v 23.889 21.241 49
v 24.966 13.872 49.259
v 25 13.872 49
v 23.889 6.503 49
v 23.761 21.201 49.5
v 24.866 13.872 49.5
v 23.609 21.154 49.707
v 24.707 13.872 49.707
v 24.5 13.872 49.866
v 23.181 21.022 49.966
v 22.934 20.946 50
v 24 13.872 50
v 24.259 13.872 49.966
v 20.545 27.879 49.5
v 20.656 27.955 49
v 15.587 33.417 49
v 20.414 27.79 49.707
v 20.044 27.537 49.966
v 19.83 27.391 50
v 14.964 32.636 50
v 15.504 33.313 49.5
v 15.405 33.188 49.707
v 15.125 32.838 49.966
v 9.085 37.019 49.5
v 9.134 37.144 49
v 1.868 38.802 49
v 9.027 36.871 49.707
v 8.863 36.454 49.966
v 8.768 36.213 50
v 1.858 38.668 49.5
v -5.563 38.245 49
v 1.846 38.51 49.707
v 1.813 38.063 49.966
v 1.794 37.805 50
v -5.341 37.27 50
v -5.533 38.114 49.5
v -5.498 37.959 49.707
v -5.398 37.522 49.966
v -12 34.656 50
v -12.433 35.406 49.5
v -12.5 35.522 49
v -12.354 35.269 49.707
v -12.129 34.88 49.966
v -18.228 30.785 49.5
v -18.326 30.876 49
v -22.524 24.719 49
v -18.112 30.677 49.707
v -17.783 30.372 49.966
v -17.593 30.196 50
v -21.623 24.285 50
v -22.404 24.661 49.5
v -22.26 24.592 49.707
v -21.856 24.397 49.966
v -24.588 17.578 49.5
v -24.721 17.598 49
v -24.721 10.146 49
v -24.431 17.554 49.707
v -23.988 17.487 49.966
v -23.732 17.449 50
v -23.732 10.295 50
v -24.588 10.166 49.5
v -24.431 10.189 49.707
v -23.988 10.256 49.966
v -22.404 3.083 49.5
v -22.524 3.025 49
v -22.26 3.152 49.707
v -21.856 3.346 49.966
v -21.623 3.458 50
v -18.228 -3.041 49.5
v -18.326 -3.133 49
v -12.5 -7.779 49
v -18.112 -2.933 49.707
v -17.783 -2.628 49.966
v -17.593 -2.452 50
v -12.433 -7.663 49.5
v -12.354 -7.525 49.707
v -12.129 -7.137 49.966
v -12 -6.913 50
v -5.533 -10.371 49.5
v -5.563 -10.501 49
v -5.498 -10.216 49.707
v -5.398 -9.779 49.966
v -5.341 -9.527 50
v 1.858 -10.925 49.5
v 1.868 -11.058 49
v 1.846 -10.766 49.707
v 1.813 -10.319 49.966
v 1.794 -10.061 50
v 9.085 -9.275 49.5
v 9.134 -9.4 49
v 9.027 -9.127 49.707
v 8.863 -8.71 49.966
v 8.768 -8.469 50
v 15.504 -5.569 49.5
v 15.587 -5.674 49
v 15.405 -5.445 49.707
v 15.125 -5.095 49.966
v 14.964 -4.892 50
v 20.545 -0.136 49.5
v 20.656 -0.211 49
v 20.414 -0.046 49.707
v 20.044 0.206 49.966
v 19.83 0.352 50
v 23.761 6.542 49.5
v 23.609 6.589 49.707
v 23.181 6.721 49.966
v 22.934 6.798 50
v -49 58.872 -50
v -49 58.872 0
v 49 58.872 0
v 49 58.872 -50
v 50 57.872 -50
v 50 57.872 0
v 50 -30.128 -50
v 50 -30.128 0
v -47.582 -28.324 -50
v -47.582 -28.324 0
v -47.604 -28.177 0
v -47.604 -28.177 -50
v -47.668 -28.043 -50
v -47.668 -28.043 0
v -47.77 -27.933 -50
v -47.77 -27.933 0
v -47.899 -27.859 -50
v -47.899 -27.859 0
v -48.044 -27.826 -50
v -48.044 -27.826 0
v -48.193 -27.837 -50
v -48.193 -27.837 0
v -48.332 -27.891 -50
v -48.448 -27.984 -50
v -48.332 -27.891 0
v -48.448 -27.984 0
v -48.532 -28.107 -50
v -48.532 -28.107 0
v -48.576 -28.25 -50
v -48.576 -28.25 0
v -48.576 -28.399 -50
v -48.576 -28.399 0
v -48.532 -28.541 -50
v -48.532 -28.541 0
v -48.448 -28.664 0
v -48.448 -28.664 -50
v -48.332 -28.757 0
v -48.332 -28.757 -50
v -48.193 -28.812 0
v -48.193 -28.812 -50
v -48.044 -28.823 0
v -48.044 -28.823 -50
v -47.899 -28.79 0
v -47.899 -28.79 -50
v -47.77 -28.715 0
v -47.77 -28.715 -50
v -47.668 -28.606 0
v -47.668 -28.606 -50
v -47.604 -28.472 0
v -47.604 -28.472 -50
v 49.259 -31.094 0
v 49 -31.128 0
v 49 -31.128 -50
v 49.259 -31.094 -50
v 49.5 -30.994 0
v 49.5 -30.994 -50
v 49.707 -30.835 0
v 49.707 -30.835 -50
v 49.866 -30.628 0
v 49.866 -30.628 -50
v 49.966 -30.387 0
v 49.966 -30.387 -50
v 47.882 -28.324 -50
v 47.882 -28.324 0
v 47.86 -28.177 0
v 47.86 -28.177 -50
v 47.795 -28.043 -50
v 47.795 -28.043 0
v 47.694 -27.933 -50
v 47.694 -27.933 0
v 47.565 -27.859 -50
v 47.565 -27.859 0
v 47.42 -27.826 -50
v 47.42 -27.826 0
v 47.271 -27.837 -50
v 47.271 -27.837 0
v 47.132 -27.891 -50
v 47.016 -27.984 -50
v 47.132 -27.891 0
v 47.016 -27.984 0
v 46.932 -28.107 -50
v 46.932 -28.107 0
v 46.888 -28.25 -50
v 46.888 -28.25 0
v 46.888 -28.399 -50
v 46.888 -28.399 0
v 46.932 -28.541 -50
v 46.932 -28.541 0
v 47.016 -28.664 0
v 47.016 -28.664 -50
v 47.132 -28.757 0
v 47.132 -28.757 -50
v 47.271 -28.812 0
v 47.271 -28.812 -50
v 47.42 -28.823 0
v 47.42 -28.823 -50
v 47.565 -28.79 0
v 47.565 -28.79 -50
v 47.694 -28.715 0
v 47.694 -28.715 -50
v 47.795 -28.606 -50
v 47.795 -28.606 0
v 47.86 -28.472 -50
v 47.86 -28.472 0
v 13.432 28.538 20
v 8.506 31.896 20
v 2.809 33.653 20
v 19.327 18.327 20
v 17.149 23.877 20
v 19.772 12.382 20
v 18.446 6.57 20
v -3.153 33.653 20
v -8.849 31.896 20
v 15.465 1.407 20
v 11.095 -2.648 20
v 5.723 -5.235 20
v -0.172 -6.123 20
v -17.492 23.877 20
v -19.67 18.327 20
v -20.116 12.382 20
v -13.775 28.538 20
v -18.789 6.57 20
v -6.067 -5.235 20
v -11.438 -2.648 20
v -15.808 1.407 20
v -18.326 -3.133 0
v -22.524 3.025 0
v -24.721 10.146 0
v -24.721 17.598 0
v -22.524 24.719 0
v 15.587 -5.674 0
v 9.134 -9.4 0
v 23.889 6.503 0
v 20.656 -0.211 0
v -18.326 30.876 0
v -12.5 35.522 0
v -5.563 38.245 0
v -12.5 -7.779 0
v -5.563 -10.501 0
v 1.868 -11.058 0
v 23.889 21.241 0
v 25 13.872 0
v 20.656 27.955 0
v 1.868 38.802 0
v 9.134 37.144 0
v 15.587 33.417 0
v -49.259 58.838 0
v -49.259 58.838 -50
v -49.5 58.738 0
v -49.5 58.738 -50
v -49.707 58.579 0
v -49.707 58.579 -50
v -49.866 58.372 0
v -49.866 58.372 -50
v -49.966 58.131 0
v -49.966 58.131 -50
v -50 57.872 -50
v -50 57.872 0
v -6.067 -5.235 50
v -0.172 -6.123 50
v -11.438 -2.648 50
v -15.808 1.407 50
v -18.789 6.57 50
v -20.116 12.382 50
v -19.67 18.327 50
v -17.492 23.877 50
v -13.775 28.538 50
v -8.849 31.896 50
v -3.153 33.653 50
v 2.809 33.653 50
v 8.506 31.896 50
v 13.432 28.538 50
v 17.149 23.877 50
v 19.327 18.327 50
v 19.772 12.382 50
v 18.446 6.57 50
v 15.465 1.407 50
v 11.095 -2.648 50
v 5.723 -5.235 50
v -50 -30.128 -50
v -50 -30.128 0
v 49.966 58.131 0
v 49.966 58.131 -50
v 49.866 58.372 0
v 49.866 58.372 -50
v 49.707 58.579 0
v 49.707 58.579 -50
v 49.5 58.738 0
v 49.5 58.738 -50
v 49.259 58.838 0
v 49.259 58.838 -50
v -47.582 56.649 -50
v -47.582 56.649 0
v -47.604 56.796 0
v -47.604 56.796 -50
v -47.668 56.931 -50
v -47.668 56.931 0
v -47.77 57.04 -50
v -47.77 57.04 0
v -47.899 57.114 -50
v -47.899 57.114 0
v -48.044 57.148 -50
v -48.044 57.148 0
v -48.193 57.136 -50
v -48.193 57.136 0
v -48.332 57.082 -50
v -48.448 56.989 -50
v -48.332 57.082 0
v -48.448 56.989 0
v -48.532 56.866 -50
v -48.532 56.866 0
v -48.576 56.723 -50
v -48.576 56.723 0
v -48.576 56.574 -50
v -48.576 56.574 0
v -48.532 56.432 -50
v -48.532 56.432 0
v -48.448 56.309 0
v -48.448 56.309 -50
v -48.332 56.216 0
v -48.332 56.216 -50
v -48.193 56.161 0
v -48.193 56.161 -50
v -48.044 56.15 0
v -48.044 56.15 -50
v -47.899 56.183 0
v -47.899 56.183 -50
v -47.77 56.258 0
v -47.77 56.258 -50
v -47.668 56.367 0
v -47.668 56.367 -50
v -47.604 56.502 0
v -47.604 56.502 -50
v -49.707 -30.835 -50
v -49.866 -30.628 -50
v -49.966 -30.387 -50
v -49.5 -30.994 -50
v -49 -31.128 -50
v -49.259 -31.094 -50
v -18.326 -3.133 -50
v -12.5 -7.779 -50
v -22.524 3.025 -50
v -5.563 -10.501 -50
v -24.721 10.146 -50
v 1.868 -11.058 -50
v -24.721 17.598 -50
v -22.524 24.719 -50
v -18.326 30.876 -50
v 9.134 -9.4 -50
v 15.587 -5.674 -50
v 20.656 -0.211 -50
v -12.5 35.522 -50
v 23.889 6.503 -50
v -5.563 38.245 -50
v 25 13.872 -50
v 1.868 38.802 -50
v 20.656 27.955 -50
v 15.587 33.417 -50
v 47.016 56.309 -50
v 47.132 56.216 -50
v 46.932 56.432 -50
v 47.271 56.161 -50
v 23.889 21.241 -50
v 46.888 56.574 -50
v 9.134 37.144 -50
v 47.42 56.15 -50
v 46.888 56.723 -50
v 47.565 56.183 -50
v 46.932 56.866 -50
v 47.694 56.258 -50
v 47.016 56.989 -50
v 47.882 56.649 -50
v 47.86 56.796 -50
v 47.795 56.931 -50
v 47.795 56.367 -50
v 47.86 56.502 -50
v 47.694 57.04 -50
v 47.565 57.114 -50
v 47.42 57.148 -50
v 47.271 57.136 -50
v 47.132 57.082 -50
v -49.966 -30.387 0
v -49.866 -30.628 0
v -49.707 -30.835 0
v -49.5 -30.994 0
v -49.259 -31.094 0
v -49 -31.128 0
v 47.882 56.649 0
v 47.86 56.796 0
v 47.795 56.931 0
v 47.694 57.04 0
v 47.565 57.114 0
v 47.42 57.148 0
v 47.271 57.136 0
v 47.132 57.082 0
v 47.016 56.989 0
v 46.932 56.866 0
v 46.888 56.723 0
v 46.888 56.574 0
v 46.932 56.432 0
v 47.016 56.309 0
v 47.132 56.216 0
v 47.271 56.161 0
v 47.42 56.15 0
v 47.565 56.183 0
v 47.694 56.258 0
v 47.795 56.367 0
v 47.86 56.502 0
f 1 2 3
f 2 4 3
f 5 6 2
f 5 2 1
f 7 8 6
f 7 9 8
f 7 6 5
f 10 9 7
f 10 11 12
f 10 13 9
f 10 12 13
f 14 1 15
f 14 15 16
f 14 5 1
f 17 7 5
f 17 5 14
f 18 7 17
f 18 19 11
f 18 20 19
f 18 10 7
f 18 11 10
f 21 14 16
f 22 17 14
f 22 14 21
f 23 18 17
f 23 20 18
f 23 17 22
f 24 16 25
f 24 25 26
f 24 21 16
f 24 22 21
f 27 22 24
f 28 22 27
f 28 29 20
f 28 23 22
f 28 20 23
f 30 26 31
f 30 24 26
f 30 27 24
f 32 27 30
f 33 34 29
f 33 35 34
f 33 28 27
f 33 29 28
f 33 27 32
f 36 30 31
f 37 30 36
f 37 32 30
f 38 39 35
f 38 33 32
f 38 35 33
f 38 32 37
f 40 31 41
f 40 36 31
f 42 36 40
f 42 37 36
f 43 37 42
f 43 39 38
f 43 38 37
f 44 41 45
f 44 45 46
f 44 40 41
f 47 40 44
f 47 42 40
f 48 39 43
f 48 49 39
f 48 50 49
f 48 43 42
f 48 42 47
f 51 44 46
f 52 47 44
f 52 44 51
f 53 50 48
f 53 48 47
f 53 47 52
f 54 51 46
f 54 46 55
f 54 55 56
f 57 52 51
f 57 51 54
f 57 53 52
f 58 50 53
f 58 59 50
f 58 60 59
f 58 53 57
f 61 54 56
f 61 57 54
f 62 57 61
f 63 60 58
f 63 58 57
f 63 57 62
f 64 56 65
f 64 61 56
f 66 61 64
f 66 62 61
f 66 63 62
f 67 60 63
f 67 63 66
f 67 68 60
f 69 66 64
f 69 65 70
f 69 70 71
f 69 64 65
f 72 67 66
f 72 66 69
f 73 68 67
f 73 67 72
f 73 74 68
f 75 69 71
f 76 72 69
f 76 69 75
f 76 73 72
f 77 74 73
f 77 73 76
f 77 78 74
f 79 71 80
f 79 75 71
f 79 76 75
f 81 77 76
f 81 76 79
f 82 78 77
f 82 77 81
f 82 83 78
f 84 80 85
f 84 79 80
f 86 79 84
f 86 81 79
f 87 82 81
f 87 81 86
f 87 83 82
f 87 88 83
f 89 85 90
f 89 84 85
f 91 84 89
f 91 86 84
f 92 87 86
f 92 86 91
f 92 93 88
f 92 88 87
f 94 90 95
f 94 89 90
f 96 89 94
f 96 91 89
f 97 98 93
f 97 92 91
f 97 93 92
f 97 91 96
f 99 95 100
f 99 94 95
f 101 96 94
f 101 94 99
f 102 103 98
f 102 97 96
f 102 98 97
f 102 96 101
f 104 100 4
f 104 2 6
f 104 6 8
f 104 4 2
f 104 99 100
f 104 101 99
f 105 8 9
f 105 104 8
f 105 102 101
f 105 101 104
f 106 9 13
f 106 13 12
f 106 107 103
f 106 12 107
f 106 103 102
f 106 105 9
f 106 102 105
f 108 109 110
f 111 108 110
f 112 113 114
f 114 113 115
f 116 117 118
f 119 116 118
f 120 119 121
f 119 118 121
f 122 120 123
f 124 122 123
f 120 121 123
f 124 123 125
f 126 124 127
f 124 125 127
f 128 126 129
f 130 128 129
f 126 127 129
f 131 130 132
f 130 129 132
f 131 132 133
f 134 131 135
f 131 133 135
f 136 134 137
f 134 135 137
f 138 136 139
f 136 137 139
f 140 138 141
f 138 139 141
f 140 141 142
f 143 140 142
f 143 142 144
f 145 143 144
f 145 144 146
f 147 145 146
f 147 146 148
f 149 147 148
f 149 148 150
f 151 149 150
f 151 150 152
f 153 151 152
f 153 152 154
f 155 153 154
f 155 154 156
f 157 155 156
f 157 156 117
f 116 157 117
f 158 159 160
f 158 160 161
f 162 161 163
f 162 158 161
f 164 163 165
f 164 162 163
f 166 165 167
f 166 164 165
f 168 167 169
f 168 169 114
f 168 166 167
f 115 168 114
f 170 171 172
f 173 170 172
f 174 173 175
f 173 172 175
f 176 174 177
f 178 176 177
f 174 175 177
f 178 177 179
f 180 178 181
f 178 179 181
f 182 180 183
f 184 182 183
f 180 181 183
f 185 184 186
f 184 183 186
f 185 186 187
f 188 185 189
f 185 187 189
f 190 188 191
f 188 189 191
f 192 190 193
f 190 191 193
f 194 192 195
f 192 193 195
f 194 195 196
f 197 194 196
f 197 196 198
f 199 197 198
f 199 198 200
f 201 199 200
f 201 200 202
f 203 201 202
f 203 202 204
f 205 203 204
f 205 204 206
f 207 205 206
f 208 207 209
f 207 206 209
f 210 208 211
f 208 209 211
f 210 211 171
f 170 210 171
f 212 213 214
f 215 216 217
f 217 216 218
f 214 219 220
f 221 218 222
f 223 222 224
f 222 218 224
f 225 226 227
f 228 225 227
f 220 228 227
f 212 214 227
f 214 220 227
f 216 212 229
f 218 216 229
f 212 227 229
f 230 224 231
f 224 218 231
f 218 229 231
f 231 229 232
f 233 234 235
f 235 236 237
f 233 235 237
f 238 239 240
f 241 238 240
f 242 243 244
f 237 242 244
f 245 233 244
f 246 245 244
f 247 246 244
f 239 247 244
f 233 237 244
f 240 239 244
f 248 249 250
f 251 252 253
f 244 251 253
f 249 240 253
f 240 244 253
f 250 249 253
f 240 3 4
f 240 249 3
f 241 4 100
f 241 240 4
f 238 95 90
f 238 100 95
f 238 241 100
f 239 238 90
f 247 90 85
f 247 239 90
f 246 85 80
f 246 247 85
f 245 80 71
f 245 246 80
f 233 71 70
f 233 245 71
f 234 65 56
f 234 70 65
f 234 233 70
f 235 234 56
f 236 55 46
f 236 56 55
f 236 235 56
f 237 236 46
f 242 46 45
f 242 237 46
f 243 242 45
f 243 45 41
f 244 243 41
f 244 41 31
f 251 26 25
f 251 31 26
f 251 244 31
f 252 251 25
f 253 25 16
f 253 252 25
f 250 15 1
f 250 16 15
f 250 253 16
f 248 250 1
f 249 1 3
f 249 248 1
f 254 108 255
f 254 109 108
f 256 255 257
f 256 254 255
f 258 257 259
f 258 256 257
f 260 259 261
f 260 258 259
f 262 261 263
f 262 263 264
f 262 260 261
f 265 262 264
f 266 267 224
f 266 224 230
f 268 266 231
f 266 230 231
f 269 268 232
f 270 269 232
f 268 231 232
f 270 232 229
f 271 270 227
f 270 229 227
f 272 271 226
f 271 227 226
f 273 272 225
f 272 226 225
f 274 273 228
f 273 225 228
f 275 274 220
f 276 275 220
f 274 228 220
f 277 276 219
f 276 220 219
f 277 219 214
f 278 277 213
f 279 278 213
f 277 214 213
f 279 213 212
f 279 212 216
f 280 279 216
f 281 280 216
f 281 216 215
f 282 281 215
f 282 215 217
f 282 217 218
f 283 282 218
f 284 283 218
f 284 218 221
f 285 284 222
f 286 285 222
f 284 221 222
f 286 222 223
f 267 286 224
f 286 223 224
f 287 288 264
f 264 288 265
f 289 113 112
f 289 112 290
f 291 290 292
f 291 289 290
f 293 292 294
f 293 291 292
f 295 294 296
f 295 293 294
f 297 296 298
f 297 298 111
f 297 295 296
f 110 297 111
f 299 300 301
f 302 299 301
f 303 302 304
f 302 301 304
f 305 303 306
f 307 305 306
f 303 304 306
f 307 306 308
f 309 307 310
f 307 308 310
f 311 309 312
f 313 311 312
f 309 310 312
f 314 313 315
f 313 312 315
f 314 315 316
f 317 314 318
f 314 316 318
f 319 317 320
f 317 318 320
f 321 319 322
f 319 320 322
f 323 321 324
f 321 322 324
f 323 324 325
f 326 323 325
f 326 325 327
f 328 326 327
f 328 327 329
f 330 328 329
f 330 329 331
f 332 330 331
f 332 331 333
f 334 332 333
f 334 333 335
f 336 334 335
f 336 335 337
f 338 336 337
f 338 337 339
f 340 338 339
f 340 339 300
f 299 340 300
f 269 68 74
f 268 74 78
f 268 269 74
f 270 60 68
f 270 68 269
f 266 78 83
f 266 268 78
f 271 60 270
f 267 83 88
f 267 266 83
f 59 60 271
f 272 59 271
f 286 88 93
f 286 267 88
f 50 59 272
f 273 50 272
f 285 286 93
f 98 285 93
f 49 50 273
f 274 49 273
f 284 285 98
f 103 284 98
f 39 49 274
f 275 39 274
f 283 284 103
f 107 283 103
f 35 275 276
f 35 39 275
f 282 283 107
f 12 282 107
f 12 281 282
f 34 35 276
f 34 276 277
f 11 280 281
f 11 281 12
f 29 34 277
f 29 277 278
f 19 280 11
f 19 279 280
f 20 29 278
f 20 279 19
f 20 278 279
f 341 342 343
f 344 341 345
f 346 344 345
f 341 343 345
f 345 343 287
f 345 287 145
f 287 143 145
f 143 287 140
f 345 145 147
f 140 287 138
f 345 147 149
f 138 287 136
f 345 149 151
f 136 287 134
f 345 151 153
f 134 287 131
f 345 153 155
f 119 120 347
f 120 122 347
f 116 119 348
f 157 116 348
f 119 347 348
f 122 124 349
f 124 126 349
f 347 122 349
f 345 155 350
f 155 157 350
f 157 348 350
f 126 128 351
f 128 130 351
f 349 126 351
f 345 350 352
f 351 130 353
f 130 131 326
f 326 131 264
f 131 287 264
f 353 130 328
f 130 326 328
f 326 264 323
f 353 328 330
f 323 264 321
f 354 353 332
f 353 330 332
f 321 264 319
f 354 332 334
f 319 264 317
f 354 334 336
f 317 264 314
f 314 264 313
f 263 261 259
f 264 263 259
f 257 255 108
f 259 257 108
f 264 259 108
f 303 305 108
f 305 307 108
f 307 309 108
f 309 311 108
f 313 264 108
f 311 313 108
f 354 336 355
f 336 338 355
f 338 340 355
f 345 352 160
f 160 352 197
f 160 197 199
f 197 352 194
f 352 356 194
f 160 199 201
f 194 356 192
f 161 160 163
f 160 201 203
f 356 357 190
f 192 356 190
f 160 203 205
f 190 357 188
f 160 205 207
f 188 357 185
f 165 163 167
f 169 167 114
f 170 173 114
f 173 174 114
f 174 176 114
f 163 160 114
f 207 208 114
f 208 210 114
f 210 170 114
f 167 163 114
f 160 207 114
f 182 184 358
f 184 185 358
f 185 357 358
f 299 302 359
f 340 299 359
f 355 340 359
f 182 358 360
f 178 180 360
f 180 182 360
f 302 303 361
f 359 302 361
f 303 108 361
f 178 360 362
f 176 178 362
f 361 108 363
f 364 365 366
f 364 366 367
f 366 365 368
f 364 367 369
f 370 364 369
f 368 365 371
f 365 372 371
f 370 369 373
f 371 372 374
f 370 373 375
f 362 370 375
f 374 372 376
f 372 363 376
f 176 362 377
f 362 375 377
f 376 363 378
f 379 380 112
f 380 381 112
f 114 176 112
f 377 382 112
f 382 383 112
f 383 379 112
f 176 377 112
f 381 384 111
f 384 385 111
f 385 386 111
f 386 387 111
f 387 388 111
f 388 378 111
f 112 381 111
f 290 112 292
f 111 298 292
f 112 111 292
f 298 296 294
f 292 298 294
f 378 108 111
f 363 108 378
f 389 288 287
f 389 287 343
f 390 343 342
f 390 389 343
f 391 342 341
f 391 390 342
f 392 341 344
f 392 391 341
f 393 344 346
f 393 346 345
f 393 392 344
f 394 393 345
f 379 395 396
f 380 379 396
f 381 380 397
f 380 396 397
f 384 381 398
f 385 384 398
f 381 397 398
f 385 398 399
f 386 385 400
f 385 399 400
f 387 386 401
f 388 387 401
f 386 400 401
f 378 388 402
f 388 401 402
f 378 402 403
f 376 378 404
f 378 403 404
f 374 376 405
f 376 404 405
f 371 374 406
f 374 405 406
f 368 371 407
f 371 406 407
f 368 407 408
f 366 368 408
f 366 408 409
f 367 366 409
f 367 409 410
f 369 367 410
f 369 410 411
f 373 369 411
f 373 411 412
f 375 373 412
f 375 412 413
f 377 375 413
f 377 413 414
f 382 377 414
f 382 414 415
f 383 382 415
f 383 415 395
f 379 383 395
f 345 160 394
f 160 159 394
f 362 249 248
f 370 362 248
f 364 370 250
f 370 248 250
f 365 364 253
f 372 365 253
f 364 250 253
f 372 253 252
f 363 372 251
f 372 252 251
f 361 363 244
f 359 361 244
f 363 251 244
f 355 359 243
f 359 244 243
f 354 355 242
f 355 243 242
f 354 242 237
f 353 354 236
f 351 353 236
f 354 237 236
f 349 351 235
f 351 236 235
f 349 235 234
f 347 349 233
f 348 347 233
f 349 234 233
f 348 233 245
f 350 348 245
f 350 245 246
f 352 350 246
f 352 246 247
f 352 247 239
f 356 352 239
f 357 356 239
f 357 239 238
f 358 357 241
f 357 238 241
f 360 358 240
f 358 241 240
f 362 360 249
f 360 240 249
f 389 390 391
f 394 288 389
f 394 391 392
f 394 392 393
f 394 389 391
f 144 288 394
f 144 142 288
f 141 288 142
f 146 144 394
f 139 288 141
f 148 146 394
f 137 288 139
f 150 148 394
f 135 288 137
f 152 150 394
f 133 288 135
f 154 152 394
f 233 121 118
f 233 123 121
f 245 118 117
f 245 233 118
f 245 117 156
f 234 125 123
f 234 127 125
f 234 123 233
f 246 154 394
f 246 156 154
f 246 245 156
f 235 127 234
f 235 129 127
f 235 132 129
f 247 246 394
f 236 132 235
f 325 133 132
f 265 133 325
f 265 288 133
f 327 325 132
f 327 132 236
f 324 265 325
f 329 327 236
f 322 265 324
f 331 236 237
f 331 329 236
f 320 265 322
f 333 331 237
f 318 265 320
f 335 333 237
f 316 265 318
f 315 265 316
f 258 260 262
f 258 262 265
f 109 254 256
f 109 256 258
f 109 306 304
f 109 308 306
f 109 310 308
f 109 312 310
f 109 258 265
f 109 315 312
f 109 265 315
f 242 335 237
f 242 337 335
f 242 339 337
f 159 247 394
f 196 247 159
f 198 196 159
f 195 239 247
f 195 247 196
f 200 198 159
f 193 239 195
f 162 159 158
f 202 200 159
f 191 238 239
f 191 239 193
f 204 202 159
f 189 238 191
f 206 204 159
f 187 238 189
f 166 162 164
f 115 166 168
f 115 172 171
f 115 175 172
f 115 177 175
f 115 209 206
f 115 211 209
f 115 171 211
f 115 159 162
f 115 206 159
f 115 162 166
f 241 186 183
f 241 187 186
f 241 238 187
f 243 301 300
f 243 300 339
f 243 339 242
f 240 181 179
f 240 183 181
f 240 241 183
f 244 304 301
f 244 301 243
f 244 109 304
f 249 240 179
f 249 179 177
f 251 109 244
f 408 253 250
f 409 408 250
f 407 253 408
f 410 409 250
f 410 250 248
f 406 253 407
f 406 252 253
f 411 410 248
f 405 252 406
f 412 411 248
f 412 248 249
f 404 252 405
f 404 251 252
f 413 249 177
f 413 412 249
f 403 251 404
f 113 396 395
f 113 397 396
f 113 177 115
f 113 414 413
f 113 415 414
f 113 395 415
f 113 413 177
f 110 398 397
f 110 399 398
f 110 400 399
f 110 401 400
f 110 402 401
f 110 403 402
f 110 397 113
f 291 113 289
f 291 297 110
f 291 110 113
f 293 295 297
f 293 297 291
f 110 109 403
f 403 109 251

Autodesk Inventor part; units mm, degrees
ref_plane "YZ Plane" through (0, 0, 0) normal (1, 0, 0) x (0, 1, 0)
ref_plane "XZ Plane" through (0, 0, 0) normal (0, 1, 0) x (-1, 0, 0)
ref_plane "XY Plane" through (0, 0, 0) normal (0, 0, 1) x (1, 0, 0)
sketch "Boceto1" plane through (0, 0, 0) normal (0, 0, 1) x (1, 0, 0)
  line L0 (-49, 58.8717) -> (49, 58.8717)
  line L1 (50, 57.8717) -> (50, -30.1283)
  line L2 (49, -31.1283) -> (-49, -31.1283)
  line L3 (-50, -30.1283) -> (-50, 57.8717)
  line L4 (-50, 58.8717) -> (50, -31.1283) construction
  line L5 (50, 58.8717) -> (-50, -31.1283) construction
  circle A0 centre (0, 13.8717) radius 25
  circle A1 centre (0, 13.8717) radius 223
  circle A2 centre (0, 13.8717) radius 23
  arc A3 (-49, 58.8717) -> (-50, 57.8717) centre (-49, 57.8717) ccw
  arc A4 (50, 57.8717) -> (49, 58.8717) centre (49, 57.8717) ccw
  arc A5 (49, -31.1283) -> (50, -30.1283) centre (49, -30.1283) ccw
  arc A6 (-50, -30.1283) -> (-49, -31.1283) centre (-49, -30.1283) ccw
  point P0 (0, 0)
  dimension "d0" = 100
  dimension "d1" = 90
  dimension "d2" = 50
  dimension "d3" = 446
  dimension "d5" = 1
extrude "Extrusión1" add sketch "Boceto1" against normal blind 50 contours L0 A4 L1 A5 L2 A6 L3 A3
extrude "Extrusión2" add sketch "Boceto1" along normal blind 50 contours A2
extrude "Extrusión3" add sketch "Boceto1" along normal blind 50 contours A0
sketch "Boceto3" plane through (0, 0, 0) normal (0, 0, 1) x (1, 0, 0)
  circle A0 centre (-48.0816, 56.6489) radius 0.5
  circle A1 centre (47.3822, 56.6489) radius 0.5
  circle A2 centre (47.3822, -28.3244) radius 0.5
  circle A3 centre (-48.0816, -28.3244) radius 0.5
  point P0 (0, 0)
extrude "Extrusión4" cut sketch "Boceto3" against normal blind 50 contours A0
extrude "Extrusión5" cut sketch "Boceto3" against normal blind 50 contours A1
extrude "Extrusión6" cut sketch "Boceto3" against normal blind 50 contours A2 | A3
sketch "Boceto4" plane through (0, 13.8717, 50) normal (0, 0, 1) x (1, 0, 0)
  point P0 (0, -13.8717)
  point P1 (-0.1718, 0.0051)
hole "Agujero2" at (-0.1718, 13.8768, 50) direction (0, 0, -1) diameter 40 depth 30
fillet "Empalme1" radius 1 1 edges at (-25, 13.8717, 50)
sketch "Boceto5" plane through (0, 0, 0) normal (0, 0, 1) x (1, 0, 0)
  point P0 (0, 0)
properties part number "Práctica #1_1104119"
